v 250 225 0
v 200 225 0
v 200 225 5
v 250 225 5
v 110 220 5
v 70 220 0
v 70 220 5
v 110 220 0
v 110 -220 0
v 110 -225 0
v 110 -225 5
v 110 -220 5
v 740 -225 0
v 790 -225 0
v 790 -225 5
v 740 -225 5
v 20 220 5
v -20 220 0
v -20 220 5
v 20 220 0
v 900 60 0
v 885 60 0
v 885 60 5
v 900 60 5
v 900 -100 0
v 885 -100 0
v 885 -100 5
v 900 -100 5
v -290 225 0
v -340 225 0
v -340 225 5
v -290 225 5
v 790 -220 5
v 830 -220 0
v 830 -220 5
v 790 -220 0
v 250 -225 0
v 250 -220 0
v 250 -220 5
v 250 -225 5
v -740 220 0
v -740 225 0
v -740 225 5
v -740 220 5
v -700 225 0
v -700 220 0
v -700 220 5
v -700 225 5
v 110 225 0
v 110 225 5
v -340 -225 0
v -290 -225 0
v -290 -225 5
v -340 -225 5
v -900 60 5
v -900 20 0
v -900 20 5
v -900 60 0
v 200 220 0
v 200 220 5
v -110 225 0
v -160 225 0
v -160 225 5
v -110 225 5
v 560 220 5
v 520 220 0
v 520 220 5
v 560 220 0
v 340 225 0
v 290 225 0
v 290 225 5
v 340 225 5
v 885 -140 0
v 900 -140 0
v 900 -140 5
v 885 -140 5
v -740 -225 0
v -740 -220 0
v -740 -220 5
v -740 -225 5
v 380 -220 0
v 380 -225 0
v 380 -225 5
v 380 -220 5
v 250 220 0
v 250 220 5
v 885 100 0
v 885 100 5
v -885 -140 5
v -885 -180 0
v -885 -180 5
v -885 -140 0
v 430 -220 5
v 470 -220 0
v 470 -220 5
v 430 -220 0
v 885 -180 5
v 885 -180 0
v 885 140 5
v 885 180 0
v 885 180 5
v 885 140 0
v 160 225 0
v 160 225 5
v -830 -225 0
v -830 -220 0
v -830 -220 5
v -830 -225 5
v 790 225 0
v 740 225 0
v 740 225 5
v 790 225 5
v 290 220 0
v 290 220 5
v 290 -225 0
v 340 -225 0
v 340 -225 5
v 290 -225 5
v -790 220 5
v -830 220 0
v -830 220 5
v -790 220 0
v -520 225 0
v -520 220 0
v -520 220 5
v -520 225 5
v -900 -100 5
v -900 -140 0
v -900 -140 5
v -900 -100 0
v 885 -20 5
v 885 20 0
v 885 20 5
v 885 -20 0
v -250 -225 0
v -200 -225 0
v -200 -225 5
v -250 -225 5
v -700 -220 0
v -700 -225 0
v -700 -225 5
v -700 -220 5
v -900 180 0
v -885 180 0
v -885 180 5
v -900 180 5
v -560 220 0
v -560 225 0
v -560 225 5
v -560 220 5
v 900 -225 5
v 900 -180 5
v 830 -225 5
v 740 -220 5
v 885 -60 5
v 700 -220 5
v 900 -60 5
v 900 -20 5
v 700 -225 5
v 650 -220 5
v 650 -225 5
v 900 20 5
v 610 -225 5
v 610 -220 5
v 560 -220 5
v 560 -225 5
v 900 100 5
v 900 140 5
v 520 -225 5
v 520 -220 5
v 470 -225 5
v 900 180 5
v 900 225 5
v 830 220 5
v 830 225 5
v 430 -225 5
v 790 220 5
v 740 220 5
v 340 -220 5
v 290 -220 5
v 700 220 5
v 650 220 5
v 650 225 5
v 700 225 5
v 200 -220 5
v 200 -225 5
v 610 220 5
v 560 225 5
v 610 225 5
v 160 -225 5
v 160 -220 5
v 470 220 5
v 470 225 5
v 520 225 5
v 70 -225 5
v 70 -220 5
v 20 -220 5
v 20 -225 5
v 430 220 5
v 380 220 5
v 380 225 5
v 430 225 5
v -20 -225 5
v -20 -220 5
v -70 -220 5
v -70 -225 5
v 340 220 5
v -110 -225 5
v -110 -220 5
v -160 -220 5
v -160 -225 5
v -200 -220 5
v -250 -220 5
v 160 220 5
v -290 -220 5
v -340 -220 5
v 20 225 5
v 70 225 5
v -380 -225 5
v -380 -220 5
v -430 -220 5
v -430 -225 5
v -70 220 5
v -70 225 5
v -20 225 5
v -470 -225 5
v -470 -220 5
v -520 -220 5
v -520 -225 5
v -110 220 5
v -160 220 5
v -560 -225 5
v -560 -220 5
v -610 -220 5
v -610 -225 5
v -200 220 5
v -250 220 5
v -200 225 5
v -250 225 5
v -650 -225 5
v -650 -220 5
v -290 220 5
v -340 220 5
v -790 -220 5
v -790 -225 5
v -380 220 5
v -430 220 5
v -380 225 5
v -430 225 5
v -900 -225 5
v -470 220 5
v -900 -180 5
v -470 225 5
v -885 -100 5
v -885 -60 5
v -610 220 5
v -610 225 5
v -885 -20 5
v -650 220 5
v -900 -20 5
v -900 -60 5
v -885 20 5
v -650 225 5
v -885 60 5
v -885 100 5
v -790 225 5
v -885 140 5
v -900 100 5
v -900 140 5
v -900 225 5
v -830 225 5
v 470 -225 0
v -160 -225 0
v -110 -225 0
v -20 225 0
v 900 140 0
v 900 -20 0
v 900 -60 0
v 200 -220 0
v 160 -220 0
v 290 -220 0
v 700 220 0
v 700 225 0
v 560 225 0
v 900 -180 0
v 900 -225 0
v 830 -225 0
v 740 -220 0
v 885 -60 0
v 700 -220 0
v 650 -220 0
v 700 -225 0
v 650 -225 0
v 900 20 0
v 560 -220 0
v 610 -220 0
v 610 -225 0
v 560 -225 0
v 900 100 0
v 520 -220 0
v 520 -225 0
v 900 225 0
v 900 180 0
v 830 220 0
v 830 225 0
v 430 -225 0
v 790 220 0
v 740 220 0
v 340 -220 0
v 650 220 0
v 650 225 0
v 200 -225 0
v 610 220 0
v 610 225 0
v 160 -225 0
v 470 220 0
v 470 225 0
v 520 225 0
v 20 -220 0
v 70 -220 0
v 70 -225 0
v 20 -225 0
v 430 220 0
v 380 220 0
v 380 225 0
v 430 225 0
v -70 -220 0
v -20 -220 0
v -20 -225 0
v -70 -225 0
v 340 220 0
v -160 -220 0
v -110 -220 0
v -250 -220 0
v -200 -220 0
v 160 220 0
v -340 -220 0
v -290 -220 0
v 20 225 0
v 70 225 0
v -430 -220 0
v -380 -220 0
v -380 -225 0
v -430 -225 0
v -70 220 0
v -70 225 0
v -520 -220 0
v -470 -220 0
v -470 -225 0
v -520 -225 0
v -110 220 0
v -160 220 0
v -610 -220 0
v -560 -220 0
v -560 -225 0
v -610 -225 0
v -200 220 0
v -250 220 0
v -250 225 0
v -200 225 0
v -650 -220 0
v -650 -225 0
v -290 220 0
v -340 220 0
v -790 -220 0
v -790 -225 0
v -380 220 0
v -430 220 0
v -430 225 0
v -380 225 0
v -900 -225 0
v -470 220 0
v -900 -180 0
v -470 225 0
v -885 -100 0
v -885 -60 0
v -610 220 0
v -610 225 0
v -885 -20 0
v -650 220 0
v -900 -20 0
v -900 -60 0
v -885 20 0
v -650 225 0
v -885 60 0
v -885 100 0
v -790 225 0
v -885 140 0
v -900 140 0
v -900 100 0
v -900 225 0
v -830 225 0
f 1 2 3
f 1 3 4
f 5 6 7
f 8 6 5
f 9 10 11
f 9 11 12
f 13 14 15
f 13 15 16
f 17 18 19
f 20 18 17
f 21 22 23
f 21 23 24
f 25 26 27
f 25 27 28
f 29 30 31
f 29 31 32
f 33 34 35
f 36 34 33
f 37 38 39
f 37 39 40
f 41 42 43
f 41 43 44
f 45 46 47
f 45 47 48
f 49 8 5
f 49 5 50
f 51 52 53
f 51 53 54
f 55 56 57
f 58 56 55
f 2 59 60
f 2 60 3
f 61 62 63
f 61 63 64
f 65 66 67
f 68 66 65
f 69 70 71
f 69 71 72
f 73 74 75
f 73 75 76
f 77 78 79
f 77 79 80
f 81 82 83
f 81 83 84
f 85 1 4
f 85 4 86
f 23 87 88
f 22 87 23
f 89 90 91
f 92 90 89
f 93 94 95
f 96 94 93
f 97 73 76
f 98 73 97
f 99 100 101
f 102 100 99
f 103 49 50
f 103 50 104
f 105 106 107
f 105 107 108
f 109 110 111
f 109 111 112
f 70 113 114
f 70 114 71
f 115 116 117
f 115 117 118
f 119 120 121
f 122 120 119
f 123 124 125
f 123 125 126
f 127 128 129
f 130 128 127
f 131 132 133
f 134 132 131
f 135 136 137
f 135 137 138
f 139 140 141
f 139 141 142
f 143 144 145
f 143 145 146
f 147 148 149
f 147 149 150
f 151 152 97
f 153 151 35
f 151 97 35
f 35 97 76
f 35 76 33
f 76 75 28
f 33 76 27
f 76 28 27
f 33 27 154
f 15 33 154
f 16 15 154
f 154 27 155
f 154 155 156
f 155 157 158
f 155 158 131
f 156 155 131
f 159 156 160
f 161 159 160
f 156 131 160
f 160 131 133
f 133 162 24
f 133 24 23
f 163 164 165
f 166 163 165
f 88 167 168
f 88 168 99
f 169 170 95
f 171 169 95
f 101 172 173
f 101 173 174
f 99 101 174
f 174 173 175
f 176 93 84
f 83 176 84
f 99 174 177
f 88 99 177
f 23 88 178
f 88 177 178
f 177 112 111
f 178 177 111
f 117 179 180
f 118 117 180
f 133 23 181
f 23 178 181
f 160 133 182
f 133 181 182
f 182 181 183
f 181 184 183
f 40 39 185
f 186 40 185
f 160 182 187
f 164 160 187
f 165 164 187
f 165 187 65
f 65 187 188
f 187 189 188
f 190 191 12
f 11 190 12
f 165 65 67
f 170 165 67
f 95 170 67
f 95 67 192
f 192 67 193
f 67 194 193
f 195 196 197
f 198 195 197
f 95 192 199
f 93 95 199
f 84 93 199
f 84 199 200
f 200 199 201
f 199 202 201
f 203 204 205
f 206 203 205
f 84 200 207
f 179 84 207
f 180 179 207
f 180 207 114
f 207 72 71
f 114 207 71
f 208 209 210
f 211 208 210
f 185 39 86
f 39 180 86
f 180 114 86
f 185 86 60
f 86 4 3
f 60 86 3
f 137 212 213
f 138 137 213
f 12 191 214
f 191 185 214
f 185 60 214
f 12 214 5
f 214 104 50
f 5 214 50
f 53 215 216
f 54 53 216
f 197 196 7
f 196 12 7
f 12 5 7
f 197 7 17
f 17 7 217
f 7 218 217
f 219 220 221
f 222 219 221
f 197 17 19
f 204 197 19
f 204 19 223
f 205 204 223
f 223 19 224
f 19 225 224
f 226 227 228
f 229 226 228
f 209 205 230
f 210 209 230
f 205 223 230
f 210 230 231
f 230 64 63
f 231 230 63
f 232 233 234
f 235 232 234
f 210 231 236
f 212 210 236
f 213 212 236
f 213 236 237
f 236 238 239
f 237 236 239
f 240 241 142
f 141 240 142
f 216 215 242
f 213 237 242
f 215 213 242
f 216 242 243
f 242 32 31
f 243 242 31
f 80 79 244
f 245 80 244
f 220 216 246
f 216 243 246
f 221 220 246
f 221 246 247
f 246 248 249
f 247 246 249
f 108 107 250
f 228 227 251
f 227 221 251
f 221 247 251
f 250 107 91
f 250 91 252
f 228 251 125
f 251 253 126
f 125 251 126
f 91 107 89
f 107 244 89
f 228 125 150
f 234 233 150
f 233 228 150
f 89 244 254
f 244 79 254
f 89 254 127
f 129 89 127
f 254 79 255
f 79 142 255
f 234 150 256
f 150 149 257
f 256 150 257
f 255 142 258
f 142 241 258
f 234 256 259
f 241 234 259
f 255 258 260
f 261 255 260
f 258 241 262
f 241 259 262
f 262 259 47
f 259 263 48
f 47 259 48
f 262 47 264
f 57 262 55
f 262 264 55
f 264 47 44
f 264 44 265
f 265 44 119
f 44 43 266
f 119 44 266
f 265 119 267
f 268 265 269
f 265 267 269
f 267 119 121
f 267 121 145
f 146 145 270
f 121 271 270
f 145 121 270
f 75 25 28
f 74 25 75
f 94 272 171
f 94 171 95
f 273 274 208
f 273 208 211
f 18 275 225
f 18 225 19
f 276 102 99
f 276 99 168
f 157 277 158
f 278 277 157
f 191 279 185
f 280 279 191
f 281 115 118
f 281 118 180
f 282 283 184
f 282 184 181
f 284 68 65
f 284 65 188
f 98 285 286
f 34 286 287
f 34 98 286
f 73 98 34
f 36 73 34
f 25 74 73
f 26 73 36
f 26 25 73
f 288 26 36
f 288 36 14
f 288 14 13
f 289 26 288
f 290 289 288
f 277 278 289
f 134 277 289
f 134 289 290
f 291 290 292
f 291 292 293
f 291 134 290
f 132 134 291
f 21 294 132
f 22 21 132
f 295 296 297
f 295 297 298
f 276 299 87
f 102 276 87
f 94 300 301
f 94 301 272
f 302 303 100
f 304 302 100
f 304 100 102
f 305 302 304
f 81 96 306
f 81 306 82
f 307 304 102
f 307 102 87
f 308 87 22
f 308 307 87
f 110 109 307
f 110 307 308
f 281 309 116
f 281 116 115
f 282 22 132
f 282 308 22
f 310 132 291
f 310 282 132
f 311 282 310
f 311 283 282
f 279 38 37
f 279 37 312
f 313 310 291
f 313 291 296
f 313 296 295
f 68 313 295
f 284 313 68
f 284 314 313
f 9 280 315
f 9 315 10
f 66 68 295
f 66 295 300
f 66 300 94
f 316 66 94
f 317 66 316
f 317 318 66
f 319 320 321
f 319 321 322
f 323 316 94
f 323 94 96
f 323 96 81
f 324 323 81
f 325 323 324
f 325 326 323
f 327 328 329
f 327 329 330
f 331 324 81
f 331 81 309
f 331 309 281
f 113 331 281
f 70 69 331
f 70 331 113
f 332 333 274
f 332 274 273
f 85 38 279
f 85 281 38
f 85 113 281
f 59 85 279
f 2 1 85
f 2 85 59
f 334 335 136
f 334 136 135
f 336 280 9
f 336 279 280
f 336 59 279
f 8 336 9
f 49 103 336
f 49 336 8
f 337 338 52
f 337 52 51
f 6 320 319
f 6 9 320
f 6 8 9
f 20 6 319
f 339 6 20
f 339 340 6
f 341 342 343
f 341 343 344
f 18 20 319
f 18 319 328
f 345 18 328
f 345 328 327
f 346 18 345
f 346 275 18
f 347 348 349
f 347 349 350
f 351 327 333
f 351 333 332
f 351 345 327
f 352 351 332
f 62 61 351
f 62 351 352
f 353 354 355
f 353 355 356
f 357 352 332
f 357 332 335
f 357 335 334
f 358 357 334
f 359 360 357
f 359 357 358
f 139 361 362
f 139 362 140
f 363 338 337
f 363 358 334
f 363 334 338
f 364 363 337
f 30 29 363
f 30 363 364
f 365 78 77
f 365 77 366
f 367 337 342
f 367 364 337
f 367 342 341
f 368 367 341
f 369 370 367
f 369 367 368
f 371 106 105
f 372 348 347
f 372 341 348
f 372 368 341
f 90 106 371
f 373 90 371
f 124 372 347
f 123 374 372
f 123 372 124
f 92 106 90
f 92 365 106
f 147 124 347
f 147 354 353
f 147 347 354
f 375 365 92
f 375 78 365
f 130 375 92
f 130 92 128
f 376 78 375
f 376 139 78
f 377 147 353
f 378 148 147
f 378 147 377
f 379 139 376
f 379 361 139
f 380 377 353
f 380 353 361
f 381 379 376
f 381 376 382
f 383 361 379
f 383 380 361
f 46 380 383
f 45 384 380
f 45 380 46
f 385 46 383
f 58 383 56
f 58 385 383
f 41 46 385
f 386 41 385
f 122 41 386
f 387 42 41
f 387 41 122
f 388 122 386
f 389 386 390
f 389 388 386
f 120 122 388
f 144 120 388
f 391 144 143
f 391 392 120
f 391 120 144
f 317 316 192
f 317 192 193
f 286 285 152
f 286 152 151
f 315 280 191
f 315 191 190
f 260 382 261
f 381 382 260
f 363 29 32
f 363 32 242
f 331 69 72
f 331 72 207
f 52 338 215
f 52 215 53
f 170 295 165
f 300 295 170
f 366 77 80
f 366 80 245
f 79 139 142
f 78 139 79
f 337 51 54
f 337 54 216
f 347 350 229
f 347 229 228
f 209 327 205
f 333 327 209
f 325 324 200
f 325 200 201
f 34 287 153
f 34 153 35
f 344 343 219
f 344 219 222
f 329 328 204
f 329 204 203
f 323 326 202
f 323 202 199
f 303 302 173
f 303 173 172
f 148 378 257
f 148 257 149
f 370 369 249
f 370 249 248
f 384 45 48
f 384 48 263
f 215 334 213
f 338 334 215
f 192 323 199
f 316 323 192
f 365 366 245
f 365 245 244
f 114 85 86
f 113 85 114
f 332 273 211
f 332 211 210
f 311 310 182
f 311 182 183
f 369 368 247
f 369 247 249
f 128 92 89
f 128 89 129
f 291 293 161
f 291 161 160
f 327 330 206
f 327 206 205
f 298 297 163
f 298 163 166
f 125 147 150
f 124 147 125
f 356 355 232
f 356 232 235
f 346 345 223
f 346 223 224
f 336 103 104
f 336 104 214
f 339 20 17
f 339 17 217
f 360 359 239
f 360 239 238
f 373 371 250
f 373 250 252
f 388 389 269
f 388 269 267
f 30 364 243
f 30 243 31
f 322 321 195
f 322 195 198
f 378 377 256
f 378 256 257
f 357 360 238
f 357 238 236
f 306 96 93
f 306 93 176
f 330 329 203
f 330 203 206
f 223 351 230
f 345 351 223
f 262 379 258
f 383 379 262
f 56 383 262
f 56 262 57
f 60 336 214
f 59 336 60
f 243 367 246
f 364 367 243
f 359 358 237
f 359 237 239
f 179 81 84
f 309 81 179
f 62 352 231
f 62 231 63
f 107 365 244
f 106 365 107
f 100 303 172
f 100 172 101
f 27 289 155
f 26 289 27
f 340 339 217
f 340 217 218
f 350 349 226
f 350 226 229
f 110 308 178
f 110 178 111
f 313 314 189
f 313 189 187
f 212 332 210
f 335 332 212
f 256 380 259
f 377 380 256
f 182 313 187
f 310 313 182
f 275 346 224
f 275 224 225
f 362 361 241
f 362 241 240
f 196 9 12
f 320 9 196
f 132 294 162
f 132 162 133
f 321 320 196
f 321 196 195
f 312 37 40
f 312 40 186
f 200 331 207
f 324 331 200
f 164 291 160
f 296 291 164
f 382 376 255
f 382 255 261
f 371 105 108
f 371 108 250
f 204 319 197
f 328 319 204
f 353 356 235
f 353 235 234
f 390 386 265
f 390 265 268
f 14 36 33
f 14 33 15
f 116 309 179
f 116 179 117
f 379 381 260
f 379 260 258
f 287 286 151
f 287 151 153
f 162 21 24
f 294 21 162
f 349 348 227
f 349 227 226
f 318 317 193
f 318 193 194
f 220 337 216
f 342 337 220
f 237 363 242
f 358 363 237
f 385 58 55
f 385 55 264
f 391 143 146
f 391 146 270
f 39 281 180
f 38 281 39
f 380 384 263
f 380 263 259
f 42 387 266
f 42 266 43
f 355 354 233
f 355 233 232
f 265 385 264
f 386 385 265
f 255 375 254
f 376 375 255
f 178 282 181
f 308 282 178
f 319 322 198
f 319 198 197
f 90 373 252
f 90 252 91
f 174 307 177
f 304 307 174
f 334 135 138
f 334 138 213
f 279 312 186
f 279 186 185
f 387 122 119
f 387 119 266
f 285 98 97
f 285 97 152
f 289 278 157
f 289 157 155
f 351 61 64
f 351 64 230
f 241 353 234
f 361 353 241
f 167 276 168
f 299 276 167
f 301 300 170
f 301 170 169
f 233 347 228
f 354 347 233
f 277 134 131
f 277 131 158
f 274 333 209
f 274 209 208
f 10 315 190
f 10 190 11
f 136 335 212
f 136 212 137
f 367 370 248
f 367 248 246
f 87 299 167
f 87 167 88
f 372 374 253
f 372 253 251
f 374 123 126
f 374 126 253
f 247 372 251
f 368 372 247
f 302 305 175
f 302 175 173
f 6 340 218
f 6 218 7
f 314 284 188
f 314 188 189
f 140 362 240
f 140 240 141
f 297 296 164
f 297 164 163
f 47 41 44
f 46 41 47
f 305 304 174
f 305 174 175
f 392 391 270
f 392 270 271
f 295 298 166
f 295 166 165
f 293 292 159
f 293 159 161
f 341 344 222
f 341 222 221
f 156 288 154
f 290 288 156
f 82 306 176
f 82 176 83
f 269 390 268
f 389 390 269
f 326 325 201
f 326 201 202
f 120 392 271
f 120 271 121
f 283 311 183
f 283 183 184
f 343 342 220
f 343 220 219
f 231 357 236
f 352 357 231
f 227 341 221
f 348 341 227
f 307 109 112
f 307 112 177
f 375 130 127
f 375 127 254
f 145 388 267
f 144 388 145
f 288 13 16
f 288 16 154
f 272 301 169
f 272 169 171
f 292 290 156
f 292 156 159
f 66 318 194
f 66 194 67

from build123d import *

# Parameters (mm, degrees)
BOSS_EXTRUDE1_DEPTH = 5


with BuildPart() as part:
    # Sketch1 → Boss-Extrude1 (new body)
    with BuildSketch(Plane.XY):
        Polygon((885, 100), (885, 60), (900, 60), (900, 20), (885, 20), (885, -20), (900, -20), (900, -60), (885, -60), (885, -100), (900, -100), (900, -140), (885, -140), (885, -180), (900, -180), (900, -225), (830, -225), (830, -220), (790, -220), (790, -225), (740, -225), (740, -220), (700, -220), (700, -225), (650, -225), (650, -220), (610, -220), (610, -225), (560, -225), (560, -220), (520, -220), (520, -225), (470, -225), (470, -220), (430, -220), (430, -225), (380, -225), (380, -220), (340, -220), (340, -225), (290, -225), (290, -220), (250, -220), (250, -225), (200, -225), (200, -220), (160, -220), (160, -225), (110, -225), (110, -220), (70, -220), (70, -225), (20, -225), (20, -220), (-20, -220), (-20, -225), (-70, -225), (-70, -220), (-110, -220), (-110, -225), (-160, -225), (-160, -220), (-200, -220), (-200, -225), (-250, -225), (-250, -220), (-290, -220), (-290, -225), (-340, -225), (-340, -220), (-380, -220), (-380, -225), (-430, -225), (-430, -220), (-470, -220), (-470, -225), (-520, -225), (-520, -220), (-560, -220), (-560, -225), (-610, -225), (-610, -220), (-650, -220), (-650, -225), (-700, -225), (-700, -220), (-740, -220), (-740, -225), (-790, -225), (-790, -220), (-830, -220), (-830, -225), (-900, -225), (-900, -180), (-885, -180), (-885, -140), (-900, -140), (-900, -100), (-885, -100), (-885, -60), (-900, -60), (-900, -20), (-885, -20), (-885, 20), (-900, 20), (-900, 60), (-885, 60), (-885, 100), (-900, 100), (-900, 140), (-885, 140), (-885, 180), (-900, 180), (-900, 225), (-830, 225), (-830, 220), (-790, 220), (-790, 225), (-740, 225), (-740, 220), (-700, 220), (-700, 225), (-650, 225), (-650, 220), (-610, 220), (-610, 225), (-560, 225), (-560, 220), (-520, 220), (-520, 225), (-470, 225), (-470, 220), (-430, 220), (-430, 225), (-380, 225), (-380, 220), (-340, 220), (-340, 225), (-290, 225), (-290, 220), (-250, 220), (-250, 225), (-200, 225), (-200, 220), (-160, 220), (-160, 225), (-110, 225), (-110, 220), (-70, 220), (-70, 225), (-20, 225), (-20, 220), (20, 220), (20, 225), (70, 225), (70, 220), (110, 220), (110, 225), (160, 225), (160, 220), (200, 220), (200, 225), (250, 225), (250, 220), (290, 220), (290, 225), (340, 225), (340, 220), (380, 220), (380, 225), (430, 225), (430, 220), (470, 220), (470, 225), (520, 225), (520, 220), (560, 220), (560, 225), (610, 225), (610, 220), (650, 220), (650, 225), (700, 225), (700, 220), (740, 220), (740, 225), (790, 225), (790, 220), (830, 220), (830, 225), (900, 225), (900, 180), (885, 180), (885, 140), (900, 140), (900, 100), align=None)
    extrude(amount=BOSS_EXTRUDE1_DEPTH)


solid = part.part
